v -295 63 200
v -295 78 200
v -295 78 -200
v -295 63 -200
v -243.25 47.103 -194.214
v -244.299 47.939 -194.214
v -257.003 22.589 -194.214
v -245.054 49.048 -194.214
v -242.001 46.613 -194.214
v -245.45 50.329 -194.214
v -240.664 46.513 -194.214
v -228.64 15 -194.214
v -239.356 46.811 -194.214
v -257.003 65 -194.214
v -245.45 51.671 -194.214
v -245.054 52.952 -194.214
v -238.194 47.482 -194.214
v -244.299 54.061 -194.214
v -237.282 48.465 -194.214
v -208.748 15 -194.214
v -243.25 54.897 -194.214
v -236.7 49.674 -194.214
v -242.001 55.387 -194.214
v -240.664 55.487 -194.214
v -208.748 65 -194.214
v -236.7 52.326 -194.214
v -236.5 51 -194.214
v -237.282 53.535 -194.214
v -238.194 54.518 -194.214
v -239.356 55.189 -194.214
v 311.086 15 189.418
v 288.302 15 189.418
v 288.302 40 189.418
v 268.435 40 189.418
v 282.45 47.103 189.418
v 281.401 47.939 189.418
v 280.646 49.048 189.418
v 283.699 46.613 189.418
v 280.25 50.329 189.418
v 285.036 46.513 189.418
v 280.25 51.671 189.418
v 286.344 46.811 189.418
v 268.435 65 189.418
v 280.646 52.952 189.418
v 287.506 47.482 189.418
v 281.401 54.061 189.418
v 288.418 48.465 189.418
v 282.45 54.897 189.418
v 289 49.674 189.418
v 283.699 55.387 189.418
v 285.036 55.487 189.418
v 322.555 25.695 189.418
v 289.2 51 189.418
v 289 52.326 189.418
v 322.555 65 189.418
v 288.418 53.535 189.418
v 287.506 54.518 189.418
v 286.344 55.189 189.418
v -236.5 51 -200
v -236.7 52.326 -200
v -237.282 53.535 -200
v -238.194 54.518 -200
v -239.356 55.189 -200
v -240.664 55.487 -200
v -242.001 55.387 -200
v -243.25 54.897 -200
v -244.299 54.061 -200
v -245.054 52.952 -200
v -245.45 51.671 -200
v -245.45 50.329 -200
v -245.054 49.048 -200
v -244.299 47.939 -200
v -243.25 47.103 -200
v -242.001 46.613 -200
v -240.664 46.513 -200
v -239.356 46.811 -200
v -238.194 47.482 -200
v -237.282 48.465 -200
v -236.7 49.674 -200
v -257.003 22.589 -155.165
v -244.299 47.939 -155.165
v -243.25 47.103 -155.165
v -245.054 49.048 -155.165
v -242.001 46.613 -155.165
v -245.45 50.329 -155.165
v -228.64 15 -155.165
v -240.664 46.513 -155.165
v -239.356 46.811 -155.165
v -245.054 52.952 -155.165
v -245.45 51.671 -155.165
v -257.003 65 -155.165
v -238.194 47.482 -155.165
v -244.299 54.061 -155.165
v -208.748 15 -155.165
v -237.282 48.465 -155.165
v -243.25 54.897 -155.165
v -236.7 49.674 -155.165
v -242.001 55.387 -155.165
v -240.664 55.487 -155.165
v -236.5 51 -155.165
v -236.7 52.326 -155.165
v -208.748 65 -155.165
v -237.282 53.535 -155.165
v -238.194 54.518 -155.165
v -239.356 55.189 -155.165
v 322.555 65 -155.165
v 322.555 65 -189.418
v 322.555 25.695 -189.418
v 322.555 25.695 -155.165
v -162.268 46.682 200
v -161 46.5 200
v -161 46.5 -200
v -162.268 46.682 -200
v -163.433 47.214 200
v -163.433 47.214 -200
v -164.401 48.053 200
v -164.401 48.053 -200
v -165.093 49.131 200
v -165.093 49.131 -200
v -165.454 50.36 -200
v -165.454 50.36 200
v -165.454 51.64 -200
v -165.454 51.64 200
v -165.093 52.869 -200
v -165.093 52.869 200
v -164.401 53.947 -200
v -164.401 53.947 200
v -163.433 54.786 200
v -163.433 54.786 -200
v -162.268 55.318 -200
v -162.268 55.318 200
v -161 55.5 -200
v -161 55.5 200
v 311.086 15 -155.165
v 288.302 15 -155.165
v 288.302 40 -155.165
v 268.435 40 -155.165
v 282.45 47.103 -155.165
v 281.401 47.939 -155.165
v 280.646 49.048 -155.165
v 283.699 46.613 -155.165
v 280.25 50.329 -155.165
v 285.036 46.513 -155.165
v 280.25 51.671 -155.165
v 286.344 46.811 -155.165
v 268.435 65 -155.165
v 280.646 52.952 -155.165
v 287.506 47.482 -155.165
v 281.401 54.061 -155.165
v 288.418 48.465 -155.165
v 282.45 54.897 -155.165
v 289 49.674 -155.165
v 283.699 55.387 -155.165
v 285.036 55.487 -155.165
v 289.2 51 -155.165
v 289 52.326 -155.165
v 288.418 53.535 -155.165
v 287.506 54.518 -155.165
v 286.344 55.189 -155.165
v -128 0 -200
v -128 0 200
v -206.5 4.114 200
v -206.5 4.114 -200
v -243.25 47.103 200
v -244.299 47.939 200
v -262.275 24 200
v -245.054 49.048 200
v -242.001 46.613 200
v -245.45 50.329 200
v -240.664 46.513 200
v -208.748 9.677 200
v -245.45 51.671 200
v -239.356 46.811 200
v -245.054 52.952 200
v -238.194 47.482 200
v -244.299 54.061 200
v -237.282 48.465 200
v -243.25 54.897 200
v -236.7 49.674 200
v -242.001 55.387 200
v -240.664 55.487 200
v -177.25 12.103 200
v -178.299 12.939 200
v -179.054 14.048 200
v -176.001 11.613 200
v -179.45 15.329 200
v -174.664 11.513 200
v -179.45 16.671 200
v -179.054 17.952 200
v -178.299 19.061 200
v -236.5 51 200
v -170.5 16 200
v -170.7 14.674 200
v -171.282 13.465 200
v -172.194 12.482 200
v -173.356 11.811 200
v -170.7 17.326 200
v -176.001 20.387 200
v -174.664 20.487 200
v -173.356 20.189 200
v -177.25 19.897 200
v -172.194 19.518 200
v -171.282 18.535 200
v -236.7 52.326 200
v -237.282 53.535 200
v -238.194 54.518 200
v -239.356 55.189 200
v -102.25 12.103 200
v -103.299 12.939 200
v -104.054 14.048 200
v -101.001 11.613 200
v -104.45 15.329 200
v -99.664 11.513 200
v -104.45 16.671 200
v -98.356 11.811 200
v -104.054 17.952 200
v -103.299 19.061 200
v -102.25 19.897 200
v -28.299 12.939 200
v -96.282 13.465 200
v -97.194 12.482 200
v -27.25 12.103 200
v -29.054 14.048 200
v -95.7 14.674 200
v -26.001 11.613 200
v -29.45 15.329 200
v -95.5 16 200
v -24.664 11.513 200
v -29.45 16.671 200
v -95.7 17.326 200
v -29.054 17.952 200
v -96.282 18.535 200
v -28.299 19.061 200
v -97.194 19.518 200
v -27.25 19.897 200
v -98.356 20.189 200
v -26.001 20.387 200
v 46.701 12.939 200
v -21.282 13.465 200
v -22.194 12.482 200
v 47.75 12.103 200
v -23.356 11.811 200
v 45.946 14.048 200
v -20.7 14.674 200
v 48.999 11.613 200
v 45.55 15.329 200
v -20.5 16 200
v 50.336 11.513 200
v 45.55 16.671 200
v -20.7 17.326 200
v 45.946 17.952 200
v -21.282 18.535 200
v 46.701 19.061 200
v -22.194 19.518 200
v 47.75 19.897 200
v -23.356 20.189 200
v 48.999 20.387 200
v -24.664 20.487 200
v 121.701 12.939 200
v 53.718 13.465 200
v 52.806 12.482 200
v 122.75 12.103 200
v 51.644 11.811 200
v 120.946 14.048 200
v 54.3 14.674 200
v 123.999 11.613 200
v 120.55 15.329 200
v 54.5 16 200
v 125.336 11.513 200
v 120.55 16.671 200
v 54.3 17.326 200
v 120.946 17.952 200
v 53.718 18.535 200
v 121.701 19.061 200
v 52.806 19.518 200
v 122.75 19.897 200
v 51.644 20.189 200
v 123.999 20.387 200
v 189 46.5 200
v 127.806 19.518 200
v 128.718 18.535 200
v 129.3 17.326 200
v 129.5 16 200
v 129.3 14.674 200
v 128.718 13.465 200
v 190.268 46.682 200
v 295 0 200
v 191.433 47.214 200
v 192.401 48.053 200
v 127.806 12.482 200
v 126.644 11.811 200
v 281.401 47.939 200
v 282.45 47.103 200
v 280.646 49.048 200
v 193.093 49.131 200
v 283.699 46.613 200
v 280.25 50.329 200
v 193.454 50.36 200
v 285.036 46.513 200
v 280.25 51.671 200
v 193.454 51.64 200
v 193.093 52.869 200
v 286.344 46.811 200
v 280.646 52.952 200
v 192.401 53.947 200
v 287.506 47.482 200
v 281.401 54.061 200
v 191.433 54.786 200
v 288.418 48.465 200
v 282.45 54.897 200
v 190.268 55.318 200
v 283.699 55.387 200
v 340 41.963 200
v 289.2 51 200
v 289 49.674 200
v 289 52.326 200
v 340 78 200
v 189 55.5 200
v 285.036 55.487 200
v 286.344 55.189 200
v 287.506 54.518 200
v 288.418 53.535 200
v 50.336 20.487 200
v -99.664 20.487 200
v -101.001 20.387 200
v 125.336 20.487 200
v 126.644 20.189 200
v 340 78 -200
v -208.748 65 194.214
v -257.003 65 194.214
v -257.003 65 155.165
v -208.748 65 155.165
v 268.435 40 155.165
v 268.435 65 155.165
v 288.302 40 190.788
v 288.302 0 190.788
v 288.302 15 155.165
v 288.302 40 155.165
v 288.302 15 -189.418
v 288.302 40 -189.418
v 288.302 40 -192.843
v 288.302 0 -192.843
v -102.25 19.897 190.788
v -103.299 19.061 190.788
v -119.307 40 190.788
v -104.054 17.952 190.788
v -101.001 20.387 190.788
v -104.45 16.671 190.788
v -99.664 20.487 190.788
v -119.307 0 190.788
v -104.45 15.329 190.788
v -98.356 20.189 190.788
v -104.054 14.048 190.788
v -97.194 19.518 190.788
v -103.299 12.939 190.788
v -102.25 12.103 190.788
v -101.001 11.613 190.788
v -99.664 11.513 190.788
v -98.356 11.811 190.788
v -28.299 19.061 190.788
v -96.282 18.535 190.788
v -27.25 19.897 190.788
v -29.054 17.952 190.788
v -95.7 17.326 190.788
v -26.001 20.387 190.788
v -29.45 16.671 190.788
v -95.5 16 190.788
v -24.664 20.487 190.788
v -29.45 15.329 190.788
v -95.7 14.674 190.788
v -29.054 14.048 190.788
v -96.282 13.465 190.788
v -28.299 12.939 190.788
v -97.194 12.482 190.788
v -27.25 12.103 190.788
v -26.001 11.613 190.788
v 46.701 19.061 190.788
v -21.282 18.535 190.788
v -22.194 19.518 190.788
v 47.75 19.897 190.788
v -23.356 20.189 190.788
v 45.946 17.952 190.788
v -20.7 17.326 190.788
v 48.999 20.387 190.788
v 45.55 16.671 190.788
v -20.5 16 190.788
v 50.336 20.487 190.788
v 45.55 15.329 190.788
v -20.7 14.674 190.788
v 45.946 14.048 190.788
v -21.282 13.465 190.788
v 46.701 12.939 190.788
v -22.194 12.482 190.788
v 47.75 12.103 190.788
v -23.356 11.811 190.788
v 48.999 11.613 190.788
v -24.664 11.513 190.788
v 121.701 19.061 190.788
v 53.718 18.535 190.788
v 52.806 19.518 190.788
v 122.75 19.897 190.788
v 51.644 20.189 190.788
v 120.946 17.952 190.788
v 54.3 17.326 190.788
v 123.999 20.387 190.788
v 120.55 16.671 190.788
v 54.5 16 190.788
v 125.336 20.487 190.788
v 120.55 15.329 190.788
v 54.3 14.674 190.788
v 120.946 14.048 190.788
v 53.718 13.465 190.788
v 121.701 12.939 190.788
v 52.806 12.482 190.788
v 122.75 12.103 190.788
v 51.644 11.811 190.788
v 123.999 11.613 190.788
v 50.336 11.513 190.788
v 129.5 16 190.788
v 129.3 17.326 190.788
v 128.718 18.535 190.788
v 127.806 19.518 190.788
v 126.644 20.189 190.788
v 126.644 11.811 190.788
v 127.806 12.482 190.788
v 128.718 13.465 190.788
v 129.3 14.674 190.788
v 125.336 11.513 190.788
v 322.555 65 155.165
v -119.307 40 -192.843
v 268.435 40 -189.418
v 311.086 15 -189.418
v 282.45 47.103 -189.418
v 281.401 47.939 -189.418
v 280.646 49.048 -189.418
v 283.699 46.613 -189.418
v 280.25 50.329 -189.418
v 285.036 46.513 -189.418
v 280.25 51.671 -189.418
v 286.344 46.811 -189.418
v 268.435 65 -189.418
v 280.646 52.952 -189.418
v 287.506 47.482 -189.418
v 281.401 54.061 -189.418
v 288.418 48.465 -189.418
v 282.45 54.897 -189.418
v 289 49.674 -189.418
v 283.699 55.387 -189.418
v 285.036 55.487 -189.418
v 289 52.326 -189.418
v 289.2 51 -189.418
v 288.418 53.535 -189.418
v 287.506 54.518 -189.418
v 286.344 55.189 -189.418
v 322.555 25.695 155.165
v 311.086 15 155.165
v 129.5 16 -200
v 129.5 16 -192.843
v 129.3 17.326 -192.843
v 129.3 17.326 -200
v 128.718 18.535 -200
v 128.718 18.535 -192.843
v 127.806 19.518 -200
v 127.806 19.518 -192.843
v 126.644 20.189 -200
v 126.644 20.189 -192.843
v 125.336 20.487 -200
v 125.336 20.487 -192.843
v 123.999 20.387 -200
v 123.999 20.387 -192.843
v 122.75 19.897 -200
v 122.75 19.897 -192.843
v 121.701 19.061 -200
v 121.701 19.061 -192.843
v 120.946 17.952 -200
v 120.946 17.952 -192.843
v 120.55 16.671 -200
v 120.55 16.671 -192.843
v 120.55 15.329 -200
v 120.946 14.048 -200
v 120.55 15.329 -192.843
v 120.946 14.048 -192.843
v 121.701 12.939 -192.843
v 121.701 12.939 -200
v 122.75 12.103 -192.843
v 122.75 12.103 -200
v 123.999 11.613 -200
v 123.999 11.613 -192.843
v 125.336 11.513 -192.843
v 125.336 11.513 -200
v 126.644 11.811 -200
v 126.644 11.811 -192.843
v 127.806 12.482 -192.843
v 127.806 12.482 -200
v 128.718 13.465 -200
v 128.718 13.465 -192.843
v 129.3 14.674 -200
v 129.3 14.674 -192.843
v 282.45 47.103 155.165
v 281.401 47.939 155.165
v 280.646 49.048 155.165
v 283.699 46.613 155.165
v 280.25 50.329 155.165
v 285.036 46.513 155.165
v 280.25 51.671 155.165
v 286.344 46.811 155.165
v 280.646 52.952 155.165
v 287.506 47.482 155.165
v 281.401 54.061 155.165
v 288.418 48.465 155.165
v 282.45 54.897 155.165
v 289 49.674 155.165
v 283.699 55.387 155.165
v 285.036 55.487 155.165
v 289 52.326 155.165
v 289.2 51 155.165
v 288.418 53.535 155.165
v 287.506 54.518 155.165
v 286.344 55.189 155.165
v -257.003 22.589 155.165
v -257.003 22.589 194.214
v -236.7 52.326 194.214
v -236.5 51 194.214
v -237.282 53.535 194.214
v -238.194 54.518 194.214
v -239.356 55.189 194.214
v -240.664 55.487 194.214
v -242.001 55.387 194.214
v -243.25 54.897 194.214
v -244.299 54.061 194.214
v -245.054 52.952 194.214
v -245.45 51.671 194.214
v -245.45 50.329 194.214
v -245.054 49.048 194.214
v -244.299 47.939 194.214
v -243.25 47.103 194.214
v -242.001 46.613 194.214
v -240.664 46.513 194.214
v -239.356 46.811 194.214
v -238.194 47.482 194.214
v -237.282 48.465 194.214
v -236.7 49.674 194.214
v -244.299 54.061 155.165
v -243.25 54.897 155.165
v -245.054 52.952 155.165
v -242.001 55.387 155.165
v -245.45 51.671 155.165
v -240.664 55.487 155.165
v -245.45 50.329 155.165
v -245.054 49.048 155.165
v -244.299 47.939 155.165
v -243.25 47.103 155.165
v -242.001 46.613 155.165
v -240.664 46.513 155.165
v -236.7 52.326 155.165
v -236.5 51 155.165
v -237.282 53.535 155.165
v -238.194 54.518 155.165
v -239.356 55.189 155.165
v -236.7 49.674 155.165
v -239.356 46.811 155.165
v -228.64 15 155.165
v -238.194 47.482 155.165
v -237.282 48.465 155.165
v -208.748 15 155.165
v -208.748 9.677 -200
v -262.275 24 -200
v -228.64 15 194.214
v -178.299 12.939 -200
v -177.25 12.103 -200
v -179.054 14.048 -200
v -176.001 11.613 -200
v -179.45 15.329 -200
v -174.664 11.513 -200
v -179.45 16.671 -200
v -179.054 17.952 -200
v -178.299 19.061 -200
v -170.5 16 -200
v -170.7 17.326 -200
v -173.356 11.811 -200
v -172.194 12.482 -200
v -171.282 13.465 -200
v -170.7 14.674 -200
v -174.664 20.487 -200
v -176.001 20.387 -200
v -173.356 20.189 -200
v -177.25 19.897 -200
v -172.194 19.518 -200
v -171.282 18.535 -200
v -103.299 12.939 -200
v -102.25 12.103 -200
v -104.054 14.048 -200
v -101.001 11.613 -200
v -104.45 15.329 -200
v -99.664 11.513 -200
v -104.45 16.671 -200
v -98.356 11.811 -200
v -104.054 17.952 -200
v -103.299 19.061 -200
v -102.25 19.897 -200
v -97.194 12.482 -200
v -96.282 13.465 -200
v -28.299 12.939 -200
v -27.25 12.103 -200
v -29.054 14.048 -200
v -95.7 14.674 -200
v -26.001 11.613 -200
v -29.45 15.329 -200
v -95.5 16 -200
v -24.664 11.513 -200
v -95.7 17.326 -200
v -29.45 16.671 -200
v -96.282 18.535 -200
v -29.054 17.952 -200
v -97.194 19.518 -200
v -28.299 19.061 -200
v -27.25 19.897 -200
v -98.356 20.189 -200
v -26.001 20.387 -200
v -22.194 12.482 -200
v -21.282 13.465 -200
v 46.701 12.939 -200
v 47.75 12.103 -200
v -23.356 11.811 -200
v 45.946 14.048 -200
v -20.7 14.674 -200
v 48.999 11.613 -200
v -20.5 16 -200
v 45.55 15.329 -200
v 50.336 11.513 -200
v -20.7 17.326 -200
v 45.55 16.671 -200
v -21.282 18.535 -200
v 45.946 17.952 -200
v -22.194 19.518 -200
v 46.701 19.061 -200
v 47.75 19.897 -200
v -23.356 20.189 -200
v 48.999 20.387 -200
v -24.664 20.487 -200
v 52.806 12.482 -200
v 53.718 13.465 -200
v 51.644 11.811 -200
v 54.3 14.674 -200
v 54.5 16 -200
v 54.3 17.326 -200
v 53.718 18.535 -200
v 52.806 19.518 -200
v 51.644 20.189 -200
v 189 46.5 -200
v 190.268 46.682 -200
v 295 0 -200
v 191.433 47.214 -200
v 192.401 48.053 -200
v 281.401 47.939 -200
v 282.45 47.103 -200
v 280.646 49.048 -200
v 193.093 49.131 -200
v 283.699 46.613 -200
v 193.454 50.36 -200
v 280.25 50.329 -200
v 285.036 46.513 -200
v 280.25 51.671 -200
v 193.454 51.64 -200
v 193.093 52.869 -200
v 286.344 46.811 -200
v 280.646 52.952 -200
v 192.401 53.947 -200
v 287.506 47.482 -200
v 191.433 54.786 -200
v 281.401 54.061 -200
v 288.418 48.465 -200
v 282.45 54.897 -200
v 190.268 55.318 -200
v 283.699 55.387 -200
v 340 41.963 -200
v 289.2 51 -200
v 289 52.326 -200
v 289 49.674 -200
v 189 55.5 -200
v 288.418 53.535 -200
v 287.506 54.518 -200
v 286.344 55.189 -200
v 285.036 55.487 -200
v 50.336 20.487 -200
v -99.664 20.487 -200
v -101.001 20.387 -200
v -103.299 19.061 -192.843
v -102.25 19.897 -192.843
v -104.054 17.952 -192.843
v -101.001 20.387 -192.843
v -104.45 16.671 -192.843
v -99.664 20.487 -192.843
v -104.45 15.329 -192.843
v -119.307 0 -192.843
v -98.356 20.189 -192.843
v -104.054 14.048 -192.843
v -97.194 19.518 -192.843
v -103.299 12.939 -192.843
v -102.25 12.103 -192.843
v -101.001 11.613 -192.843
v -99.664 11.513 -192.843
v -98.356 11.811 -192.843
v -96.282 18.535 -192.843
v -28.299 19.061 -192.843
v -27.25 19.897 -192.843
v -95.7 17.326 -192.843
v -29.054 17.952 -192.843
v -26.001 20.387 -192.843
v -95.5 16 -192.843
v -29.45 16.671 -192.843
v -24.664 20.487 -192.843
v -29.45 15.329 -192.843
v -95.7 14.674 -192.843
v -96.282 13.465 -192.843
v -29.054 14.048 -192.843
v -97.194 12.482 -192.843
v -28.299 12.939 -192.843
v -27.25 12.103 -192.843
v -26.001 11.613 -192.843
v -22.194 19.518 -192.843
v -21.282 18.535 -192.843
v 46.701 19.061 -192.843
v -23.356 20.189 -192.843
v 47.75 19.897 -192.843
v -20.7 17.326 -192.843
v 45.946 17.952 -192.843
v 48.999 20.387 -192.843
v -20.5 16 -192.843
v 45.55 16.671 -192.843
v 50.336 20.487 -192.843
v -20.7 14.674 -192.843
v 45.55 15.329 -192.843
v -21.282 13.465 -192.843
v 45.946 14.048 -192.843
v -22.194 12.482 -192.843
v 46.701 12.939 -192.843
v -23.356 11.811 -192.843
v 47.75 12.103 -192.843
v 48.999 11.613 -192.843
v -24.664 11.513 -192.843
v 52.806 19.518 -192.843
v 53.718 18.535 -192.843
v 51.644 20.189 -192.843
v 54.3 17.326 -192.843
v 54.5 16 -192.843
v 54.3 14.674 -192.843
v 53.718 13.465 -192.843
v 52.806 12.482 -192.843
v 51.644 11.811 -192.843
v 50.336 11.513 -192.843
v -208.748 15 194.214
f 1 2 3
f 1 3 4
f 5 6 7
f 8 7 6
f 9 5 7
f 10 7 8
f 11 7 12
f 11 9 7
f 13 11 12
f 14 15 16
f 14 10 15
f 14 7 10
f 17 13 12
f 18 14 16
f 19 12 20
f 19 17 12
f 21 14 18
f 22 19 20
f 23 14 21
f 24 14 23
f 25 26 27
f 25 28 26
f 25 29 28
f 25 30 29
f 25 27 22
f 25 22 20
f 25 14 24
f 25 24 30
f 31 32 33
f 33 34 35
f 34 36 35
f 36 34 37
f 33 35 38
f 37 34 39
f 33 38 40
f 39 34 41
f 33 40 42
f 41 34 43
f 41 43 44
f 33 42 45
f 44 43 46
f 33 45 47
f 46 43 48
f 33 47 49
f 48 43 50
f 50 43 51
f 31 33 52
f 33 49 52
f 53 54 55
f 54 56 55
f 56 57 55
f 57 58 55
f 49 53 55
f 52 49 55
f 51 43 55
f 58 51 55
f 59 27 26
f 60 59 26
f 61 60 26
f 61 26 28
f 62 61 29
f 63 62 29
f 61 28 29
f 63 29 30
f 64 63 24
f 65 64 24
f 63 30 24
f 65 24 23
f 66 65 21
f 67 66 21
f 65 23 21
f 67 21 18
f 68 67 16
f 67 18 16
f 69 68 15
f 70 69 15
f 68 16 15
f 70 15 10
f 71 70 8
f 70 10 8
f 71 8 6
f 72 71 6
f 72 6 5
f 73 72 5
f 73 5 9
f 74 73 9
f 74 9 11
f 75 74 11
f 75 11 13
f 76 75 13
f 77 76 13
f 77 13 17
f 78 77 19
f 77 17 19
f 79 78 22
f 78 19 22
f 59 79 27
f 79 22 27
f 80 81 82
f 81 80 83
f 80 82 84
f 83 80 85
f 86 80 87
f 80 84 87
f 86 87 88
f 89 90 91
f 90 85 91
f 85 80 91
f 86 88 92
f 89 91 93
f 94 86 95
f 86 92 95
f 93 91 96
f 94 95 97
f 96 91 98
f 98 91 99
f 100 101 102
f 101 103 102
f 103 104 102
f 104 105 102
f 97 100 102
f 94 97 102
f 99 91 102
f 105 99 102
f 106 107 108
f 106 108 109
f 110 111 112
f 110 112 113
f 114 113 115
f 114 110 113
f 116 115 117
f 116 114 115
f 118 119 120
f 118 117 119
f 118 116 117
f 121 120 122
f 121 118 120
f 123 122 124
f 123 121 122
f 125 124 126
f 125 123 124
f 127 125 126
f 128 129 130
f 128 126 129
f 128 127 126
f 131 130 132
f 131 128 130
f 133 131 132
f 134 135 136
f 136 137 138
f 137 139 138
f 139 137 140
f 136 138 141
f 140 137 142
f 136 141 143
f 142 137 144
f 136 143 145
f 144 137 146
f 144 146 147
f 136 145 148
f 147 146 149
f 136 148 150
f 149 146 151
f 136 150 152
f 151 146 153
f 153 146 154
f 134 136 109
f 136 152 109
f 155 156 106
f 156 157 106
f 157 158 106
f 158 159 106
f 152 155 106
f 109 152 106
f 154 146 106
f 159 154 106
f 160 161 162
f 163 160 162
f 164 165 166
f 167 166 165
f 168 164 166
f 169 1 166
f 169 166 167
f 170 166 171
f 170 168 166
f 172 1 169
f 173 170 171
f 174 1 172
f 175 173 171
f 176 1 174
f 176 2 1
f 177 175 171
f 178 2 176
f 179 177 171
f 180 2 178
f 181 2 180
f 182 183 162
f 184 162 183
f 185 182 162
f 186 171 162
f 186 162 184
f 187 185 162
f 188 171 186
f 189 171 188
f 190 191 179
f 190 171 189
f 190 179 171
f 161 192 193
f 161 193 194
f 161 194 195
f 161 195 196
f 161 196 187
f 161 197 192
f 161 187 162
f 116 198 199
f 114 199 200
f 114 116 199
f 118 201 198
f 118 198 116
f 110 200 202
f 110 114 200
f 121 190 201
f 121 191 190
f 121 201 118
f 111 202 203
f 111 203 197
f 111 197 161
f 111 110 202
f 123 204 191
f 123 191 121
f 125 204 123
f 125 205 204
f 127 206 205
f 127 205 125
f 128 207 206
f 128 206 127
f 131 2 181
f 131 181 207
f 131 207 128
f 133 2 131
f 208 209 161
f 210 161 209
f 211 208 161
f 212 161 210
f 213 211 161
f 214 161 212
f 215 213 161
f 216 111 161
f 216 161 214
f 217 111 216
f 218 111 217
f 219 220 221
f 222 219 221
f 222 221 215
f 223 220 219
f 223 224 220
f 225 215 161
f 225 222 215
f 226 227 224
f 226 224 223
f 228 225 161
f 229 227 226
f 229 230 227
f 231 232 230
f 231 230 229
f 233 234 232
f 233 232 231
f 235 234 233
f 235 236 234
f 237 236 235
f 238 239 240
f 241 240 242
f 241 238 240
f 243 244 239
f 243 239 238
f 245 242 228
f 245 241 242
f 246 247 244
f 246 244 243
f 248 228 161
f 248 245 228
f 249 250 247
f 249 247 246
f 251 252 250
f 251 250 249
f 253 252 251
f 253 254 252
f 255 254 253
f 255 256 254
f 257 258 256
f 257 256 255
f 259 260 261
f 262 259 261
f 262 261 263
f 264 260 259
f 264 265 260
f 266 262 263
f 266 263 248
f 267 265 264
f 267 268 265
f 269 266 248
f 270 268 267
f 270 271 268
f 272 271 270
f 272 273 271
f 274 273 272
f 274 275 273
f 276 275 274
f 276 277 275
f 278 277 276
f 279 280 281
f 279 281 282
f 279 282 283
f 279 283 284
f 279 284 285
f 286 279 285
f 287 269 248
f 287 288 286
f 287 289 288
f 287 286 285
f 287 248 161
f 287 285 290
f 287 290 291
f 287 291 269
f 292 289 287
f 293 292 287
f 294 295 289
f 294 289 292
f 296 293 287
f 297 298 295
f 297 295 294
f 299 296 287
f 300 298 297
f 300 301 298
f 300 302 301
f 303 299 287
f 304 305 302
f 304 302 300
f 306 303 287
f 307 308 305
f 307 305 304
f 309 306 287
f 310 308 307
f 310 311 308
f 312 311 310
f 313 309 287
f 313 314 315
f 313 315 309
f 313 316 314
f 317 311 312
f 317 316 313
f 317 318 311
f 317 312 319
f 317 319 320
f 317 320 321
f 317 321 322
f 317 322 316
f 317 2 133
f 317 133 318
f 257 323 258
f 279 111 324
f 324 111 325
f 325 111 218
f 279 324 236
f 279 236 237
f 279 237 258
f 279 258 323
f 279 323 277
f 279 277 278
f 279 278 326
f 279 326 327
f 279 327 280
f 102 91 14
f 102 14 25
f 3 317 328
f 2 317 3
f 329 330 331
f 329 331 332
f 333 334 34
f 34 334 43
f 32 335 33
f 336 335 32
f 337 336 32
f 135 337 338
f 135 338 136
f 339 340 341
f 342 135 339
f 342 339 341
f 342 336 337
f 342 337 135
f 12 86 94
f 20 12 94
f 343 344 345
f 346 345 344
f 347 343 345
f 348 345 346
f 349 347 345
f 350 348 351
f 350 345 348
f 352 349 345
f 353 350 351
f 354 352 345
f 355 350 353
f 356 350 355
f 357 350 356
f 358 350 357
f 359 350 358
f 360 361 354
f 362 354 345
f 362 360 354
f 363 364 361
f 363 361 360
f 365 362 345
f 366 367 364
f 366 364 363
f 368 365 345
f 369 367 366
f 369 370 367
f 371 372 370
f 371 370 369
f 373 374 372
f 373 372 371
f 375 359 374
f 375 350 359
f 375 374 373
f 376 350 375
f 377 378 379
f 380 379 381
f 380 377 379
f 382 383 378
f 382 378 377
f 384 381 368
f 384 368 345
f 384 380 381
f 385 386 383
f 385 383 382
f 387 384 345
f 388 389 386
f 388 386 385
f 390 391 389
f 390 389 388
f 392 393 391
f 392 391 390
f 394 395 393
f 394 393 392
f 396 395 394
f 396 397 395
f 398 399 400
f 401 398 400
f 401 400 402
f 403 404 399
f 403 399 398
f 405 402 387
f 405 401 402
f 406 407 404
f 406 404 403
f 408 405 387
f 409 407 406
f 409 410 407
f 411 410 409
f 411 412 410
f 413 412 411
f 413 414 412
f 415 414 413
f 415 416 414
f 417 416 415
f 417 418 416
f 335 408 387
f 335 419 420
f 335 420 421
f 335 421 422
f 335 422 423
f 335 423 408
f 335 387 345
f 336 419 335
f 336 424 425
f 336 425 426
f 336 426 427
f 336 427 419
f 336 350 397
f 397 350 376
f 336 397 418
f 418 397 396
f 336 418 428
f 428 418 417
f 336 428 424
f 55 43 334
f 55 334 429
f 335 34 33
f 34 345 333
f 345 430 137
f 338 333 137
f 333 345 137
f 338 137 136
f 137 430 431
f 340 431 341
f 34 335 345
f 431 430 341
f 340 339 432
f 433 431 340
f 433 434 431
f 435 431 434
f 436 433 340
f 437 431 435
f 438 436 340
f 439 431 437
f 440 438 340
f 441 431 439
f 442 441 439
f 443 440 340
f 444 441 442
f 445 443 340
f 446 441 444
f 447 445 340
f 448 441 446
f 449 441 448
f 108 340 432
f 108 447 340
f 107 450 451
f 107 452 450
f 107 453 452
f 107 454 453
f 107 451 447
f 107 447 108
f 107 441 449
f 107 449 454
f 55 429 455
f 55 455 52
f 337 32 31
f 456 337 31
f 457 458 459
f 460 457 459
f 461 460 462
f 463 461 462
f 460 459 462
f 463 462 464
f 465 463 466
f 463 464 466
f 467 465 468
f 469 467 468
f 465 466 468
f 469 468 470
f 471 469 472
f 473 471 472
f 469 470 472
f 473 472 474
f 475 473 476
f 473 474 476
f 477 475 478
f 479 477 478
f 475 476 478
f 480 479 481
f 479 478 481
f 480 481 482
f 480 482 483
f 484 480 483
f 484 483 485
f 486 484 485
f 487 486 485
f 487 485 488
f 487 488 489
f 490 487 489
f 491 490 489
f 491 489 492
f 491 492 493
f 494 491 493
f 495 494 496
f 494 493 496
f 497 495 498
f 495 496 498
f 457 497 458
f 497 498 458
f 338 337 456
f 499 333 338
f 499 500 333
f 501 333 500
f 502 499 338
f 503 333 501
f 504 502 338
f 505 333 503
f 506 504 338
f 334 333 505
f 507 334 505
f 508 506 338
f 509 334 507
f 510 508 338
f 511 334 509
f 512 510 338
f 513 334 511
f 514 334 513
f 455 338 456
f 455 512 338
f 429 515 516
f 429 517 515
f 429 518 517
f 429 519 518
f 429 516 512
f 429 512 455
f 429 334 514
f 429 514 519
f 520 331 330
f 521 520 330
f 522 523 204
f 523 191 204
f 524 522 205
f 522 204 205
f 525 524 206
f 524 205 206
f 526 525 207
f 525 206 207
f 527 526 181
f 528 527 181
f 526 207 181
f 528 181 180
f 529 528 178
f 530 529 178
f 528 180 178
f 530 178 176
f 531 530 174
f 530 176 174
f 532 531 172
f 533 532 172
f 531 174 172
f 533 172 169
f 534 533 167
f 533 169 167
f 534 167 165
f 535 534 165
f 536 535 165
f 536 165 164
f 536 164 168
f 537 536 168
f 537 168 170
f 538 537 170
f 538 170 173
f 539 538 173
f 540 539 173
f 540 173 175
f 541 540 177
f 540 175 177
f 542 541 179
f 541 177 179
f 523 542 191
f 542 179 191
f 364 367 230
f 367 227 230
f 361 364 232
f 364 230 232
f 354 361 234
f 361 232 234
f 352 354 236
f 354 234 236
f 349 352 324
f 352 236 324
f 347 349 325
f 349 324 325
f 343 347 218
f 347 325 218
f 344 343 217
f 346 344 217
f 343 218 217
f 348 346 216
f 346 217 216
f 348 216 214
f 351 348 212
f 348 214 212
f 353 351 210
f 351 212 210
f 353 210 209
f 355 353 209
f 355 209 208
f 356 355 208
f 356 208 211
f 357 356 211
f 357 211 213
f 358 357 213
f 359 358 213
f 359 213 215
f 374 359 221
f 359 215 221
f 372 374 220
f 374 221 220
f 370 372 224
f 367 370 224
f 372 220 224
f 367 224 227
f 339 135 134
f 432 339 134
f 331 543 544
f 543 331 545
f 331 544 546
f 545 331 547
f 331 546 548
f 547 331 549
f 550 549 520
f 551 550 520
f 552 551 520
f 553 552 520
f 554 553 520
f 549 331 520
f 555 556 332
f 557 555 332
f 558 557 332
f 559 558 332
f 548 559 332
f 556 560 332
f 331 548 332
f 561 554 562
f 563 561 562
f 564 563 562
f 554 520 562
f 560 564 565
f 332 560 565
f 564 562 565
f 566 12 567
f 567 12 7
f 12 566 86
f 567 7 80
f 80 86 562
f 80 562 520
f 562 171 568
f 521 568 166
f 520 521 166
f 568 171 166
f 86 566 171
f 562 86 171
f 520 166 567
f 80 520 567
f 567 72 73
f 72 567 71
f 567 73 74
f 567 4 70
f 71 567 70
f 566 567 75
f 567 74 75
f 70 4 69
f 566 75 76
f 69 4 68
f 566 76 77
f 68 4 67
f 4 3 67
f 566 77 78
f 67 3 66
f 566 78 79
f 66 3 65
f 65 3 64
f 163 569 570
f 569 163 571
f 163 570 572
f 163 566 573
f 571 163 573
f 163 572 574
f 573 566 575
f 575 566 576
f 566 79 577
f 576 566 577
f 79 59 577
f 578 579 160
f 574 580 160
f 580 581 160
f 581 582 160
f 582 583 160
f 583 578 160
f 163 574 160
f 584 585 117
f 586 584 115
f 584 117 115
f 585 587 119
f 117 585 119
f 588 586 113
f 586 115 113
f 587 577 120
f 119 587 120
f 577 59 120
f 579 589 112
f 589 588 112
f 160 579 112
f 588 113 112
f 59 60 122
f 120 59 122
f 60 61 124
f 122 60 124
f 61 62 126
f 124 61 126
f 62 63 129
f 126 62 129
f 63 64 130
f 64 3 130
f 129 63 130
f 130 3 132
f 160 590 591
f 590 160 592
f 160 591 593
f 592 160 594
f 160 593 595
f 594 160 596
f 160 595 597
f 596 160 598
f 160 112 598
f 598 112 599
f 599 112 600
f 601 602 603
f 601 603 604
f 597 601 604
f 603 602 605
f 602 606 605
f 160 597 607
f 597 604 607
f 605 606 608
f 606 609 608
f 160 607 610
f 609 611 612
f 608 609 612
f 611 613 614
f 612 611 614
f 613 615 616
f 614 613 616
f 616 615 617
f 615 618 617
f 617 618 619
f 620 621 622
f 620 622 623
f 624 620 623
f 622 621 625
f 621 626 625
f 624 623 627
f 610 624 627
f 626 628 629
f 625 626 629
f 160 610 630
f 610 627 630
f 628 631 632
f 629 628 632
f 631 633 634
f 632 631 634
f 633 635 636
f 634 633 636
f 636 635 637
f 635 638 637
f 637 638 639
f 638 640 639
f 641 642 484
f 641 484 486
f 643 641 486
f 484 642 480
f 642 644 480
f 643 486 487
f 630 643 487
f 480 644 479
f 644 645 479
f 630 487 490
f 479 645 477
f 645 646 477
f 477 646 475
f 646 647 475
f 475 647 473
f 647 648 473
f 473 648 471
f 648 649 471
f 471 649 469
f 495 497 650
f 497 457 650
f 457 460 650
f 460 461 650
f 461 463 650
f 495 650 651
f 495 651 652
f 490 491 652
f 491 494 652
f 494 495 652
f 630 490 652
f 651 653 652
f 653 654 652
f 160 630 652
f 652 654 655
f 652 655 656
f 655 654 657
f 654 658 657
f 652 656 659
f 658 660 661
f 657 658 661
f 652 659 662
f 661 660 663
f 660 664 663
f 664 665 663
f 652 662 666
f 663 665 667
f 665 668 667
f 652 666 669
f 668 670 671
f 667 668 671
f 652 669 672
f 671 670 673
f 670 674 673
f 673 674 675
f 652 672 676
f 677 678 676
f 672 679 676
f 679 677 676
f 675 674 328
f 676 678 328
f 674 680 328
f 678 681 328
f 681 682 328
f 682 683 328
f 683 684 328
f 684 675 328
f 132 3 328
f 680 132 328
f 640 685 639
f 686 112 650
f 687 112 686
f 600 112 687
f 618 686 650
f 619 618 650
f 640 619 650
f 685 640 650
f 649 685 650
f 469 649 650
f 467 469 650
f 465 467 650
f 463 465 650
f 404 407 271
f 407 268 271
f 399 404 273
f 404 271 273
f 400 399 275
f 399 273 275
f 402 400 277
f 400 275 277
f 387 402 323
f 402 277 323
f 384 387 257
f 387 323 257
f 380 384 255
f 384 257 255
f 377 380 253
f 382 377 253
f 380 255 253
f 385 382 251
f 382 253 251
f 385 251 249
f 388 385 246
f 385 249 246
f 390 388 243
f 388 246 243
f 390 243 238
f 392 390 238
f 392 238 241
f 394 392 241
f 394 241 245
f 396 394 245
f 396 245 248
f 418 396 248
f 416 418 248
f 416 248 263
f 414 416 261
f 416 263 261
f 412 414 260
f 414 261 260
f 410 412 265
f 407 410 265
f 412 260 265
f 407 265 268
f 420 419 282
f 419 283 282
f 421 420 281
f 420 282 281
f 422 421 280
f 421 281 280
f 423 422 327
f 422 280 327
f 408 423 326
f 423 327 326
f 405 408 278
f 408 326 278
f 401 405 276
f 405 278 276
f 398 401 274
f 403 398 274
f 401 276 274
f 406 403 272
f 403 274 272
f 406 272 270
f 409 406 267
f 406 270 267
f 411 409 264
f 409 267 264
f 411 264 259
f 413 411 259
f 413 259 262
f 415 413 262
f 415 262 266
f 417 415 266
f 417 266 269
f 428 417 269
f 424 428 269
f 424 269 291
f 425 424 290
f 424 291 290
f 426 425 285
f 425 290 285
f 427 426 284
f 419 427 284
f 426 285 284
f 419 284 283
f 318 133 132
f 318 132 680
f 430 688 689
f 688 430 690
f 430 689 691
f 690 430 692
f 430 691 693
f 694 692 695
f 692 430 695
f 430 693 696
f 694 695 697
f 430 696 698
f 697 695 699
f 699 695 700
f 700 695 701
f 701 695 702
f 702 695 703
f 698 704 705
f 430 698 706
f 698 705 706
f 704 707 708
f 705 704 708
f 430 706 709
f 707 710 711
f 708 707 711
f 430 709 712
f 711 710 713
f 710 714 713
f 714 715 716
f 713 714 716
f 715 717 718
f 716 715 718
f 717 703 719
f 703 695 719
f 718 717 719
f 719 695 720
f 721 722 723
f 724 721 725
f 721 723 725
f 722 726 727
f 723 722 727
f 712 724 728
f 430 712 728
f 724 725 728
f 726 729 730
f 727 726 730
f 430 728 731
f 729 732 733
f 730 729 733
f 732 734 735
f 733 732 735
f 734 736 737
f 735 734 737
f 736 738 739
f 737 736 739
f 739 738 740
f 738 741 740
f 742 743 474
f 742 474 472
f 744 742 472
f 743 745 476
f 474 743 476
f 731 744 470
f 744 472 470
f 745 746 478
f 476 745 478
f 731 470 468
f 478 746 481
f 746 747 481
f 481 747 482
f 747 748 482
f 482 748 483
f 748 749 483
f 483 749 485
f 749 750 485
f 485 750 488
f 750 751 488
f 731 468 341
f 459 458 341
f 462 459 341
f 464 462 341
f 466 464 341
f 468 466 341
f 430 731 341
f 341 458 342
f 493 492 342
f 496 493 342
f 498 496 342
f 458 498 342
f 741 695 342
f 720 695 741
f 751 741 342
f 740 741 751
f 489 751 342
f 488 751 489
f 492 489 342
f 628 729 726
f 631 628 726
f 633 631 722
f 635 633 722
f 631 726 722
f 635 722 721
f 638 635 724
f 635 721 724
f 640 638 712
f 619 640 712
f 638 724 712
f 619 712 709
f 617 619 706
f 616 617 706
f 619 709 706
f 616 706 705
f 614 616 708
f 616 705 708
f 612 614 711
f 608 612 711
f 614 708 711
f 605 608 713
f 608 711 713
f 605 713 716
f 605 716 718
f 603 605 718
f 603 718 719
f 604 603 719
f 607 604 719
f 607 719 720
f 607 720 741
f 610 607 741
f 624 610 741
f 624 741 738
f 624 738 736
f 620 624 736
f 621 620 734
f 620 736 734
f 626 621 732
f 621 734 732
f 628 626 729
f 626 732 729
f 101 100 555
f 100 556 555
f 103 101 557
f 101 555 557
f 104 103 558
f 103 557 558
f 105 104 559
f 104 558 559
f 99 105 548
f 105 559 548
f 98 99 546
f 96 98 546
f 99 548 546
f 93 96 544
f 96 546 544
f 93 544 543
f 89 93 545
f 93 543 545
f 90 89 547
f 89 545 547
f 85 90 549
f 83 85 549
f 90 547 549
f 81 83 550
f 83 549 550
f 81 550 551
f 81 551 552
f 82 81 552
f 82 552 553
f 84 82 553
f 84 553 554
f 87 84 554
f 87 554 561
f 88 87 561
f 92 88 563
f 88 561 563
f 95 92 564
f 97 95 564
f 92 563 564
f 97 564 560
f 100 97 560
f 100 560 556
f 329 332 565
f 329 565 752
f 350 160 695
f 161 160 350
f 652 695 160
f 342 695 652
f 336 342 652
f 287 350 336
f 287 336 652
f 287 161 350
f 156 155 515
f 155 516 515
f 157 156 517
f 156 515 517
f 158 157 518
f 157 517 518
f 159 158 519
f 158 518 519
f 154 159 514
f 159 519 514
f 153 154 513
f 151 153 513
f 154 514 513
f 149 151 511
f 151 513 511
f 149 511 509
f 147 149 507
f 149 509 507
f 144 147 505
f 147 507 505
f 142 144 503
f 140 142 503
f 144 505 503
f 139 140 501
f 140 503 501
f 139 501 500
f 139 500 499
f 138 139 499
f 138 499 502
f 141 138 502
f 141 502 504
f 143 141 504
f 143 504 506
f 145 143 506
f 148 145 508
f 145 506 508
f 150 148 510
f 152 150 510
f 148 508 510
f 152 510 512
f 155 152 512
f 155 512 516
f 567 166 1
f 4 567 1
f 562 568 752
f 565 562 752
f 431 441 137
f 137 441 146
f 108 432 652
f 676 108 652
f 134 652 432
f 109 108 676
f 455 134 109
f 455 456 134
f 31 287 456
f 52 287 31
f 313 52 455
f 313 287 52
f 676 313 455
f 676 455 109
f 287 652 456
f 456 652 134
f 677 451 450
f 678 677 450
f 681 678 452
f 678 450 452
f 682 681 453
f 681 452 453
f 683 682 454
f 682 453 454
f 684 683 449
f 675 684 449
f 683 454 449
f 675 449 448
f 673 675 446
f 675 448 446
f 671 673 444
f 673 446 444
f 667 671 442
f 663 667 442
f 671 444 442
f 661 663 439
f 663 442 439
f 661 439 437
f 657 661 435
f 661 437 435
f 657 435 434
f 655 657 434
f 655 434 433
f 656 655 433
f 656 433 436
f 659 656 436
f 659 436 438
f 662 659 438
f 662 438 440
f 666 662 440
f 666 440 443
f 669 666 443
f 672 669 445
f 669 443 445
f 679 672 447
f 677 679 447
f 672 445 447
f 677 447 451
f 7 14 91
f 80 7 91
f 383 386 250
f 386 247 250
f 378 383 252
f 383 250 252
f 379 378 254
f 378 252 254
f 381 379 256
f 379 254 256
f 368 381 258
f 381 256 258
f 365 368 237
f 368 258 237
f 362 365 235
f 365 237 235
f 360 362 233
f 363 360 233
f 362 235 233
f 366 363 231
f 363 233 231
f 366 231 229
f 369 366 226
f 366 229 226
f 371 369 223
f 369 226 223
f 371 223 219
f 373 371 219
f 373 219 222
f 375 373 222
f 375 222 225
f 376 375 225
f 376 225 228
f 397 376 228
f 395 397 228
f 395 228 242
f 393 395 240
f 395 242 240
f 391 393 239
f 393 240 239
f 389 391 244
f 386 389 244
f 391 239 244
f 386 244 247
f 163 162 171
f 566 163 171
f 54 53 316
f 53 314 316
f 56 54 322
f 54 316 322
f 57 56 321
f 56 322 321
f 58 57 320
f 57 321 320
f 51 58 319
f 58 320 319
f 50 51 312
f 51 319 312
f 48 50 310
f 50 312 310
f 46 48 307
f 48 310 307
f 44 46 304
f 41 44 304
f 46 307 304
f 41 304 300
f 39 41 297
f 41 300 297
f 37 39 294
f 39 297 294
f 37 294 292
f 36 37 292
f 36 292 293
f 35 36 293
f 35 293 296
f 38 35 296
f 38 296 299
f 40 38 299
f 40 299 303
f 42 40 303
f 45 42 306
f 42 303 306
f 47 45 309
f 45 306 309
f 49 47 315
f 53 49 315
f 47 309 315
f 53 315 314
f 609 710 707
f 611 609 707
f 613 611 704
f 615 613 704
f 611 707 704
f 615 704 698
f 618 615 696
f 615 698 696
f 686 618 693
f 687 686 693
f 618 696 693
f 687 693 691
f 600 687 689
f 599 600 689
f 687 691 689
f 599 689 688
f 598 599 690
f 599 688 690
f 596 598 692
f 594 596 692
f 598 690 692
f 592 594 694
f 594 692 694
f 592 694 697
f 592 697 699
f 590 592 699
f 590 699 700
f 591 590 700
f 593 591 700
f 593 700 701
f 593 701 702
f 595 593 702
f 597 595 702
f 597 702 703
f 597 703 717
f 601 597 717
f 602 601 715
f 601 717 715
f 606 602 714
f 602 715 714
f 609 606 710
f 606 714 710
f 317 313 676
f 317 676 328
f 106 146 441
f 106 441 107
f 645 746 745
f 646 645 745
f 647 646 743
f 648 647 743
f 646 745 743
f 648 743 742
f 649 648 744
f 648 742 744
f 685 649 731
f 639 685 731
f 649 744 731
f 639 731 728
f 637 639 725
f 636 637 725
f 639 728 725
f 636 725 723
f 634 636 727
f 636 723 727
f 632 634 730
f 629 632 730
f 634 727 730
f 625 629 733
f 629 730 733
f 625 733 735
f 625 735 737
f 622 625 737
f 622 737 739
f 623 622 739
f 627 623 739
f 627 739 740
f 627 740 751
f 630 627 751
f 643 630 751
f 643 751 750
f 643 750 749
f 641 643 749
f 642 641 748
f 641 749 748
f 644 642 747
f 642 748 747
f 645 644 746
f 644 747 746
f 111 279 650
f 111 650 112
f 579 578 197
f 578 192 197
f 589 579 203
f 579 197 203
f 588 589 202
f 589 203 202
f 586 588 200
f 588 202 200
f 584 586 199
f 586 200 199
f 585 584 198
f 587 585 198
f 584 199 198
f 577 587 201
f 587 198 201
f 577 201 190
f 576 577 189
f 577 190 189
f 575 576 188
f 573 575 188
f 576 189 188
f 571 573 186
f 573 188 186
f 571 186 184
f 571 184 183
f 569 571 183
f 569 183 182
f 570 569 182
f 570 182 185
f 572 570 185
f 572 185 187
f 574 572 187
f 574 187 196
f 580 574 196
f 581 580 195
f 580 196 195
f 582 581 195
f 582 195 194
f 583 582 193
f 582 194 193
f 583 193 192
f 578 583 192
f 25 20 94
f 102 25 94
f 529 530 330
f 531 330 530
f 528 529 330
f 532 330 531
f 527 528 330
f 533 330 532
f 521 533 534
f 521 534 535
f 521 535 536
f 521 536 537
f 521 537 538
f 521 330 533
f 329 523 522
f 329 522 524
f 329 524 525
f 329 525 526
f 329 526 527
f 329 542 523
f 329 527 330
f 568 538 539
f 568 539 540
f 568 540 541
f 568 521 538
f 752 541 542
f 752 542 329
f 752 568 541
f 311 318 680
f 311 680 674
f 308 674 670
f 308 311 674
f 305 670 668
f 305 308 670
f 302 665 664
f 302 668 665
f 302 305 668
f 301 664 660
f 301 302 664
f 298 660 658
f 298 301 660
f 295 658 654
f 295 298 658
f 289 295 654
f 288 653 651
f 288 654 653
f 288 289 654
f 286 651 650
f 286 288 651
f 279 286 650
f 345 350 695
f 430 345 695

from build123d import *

# Parameters (mm, degrees)
BOSS_EXTRUDE1_DEPTH     = 200
CUT_EXTRUDE1_DEPTH      = 1875
CUT_EXTRUDE2_DEPTH      = 1
CUT_EXTRUDE2_DEPTH_BACK = 401
SKETCH9_R               = 4.5
CUT_EXTRUDE8_DEPTH      = 535
SKETCH10_W              = 407.608738225
SKETCH10_H              = 383.631753623
CUT_EXTRUDE9_DEPTH      = 40
SKETCH11_W              = 54.119479529
SKETCH11_H              = 34.252835145
SKETCH11_W_2            = 48.255495223
SKETCH11_H_2            = 39.048232065
CUT_EXTRUDE10_DEPTH     = 25


with BuildPart() as part:
    # Sketch1 → Boss-Extrude1 (new body, symmetric)
    with BuildSketch(Plane.XY):
        Polygon((295, 0), (340, 41.963178876), (340, 78), (-295, 78), (-295, 0), align=None)
    extrude(amount=BOSS_EXTRUDE1_DEPTH, both=True)

    # Sketch2 → Cut-Extrude1 (cut)
    with BuildSketch(Plane.XY.offset(200)):
        Polygon((-247.386799314, 6.256797028), (-295, 63), (-295, 0), (-128, 0), align=None)
    extrude(amount=-CUT_EXTRUDE1_DEPTH, mode=Mode.SUBTRACT)

    # Sketch3 → Cut-Extrude2 (cut, two sides)
    with BuildSketch(Plane.XY.offset(200)) as cut_extrude2_sk:
        Polygon((250.288603953, -1126.47745776), (-206.5, 4.114010674), (-208.74763956, 9.677113801), (-262.275114384, 24), (-1440.216479918, 339.193649301), (-3037.790452197, -1503.448201922), (-1347.285368327, -2969.119308982), align=None)
    extrude(amount=CUT_EXTRUDE2_DEPTH, mode=Mode.SUBTRACT)
    extrude(cut_extrude2_sk.sketch, amount=-CUT_EXTRUDE2_DEPTH_BACK, mode=Mode.SUBTRACT)

    # Sketch9 → Cut-Extrude8 (cut, symmetric)
    with BuildSketch(Plane.XY):
        with Locations((-175, 16)):
            Circle(SKETCH9_R)
        with Locations((-100, 16)):
            Circle(SKETCH9_R)
        with Locations((-25, 16)):
            Circle(SKETCH9_R)
        with Locations((50, 16)):
            Circle(SKETCH9_R)
        with Locations((125, 16)):
            Circle(SKETCH9_R)
        with Locations((-241, 51)):
            Circle(SKETCH9_R)
        with Locations((284.7, 51)):
            Circle(SKETCH9_R)
        with BuildLine():
            Line((-161, 55.5), (189, 55.5))
            ThreePointArc((189, 55.5), (193.5, 51), (189, 46.5))
            Line((189, 46.5), (-161, 46.5))
            ThreePointArc((-161, 46.5), (-165.5, 51), (-161, 55.5))
        make_face()
    extrude(amount=CUT_EXTRUDE8_DEPTH, both=True, mode=Mode.SUBTRACT)

    # Sketch10 → Cut-Extrude9 (cut)
    with BuildSketch(Plane(origin=(0, 0, 0), x_dir=(1, 0, 0), z_dir=(0, 1, 0))):
        with Locations((84.497631613, 1.027585054)):
            Rectangle(SKETCH10_W, SKETCH10_H)
    extrude(amount=CUT_EXTRUDE9_DEPTH, mode=Mode.SUBTRACT)

    # Sketch11 → Cut-Extrude10 (cut, symmetric)
    with BuildSketch(Plane.XZ.offset(-40)):
        with Locations((295.495096106, -172.29176078)):
            Rectangle(SKETCH11_W, SKETCH11_H)
        with Locations((-232.875387171, -174.68945924)):
            Rectangle(SKETCH11_W_2, SKETCH11_H_2)
        with Locations((295.495096106, 172.29176078)):
            Rectangle(SKETCH11_W, SKETCH11_H)
        with Locations((-232.875387171, 174.68945924)):
            Rectangle(SKETCH11_W_2, SKETCH11_H_2)
    extrude(amount=CUT_EXTRUDE10_DEPTH, both=True, mode=Mode.SUBTRACT)


solid = part.part
